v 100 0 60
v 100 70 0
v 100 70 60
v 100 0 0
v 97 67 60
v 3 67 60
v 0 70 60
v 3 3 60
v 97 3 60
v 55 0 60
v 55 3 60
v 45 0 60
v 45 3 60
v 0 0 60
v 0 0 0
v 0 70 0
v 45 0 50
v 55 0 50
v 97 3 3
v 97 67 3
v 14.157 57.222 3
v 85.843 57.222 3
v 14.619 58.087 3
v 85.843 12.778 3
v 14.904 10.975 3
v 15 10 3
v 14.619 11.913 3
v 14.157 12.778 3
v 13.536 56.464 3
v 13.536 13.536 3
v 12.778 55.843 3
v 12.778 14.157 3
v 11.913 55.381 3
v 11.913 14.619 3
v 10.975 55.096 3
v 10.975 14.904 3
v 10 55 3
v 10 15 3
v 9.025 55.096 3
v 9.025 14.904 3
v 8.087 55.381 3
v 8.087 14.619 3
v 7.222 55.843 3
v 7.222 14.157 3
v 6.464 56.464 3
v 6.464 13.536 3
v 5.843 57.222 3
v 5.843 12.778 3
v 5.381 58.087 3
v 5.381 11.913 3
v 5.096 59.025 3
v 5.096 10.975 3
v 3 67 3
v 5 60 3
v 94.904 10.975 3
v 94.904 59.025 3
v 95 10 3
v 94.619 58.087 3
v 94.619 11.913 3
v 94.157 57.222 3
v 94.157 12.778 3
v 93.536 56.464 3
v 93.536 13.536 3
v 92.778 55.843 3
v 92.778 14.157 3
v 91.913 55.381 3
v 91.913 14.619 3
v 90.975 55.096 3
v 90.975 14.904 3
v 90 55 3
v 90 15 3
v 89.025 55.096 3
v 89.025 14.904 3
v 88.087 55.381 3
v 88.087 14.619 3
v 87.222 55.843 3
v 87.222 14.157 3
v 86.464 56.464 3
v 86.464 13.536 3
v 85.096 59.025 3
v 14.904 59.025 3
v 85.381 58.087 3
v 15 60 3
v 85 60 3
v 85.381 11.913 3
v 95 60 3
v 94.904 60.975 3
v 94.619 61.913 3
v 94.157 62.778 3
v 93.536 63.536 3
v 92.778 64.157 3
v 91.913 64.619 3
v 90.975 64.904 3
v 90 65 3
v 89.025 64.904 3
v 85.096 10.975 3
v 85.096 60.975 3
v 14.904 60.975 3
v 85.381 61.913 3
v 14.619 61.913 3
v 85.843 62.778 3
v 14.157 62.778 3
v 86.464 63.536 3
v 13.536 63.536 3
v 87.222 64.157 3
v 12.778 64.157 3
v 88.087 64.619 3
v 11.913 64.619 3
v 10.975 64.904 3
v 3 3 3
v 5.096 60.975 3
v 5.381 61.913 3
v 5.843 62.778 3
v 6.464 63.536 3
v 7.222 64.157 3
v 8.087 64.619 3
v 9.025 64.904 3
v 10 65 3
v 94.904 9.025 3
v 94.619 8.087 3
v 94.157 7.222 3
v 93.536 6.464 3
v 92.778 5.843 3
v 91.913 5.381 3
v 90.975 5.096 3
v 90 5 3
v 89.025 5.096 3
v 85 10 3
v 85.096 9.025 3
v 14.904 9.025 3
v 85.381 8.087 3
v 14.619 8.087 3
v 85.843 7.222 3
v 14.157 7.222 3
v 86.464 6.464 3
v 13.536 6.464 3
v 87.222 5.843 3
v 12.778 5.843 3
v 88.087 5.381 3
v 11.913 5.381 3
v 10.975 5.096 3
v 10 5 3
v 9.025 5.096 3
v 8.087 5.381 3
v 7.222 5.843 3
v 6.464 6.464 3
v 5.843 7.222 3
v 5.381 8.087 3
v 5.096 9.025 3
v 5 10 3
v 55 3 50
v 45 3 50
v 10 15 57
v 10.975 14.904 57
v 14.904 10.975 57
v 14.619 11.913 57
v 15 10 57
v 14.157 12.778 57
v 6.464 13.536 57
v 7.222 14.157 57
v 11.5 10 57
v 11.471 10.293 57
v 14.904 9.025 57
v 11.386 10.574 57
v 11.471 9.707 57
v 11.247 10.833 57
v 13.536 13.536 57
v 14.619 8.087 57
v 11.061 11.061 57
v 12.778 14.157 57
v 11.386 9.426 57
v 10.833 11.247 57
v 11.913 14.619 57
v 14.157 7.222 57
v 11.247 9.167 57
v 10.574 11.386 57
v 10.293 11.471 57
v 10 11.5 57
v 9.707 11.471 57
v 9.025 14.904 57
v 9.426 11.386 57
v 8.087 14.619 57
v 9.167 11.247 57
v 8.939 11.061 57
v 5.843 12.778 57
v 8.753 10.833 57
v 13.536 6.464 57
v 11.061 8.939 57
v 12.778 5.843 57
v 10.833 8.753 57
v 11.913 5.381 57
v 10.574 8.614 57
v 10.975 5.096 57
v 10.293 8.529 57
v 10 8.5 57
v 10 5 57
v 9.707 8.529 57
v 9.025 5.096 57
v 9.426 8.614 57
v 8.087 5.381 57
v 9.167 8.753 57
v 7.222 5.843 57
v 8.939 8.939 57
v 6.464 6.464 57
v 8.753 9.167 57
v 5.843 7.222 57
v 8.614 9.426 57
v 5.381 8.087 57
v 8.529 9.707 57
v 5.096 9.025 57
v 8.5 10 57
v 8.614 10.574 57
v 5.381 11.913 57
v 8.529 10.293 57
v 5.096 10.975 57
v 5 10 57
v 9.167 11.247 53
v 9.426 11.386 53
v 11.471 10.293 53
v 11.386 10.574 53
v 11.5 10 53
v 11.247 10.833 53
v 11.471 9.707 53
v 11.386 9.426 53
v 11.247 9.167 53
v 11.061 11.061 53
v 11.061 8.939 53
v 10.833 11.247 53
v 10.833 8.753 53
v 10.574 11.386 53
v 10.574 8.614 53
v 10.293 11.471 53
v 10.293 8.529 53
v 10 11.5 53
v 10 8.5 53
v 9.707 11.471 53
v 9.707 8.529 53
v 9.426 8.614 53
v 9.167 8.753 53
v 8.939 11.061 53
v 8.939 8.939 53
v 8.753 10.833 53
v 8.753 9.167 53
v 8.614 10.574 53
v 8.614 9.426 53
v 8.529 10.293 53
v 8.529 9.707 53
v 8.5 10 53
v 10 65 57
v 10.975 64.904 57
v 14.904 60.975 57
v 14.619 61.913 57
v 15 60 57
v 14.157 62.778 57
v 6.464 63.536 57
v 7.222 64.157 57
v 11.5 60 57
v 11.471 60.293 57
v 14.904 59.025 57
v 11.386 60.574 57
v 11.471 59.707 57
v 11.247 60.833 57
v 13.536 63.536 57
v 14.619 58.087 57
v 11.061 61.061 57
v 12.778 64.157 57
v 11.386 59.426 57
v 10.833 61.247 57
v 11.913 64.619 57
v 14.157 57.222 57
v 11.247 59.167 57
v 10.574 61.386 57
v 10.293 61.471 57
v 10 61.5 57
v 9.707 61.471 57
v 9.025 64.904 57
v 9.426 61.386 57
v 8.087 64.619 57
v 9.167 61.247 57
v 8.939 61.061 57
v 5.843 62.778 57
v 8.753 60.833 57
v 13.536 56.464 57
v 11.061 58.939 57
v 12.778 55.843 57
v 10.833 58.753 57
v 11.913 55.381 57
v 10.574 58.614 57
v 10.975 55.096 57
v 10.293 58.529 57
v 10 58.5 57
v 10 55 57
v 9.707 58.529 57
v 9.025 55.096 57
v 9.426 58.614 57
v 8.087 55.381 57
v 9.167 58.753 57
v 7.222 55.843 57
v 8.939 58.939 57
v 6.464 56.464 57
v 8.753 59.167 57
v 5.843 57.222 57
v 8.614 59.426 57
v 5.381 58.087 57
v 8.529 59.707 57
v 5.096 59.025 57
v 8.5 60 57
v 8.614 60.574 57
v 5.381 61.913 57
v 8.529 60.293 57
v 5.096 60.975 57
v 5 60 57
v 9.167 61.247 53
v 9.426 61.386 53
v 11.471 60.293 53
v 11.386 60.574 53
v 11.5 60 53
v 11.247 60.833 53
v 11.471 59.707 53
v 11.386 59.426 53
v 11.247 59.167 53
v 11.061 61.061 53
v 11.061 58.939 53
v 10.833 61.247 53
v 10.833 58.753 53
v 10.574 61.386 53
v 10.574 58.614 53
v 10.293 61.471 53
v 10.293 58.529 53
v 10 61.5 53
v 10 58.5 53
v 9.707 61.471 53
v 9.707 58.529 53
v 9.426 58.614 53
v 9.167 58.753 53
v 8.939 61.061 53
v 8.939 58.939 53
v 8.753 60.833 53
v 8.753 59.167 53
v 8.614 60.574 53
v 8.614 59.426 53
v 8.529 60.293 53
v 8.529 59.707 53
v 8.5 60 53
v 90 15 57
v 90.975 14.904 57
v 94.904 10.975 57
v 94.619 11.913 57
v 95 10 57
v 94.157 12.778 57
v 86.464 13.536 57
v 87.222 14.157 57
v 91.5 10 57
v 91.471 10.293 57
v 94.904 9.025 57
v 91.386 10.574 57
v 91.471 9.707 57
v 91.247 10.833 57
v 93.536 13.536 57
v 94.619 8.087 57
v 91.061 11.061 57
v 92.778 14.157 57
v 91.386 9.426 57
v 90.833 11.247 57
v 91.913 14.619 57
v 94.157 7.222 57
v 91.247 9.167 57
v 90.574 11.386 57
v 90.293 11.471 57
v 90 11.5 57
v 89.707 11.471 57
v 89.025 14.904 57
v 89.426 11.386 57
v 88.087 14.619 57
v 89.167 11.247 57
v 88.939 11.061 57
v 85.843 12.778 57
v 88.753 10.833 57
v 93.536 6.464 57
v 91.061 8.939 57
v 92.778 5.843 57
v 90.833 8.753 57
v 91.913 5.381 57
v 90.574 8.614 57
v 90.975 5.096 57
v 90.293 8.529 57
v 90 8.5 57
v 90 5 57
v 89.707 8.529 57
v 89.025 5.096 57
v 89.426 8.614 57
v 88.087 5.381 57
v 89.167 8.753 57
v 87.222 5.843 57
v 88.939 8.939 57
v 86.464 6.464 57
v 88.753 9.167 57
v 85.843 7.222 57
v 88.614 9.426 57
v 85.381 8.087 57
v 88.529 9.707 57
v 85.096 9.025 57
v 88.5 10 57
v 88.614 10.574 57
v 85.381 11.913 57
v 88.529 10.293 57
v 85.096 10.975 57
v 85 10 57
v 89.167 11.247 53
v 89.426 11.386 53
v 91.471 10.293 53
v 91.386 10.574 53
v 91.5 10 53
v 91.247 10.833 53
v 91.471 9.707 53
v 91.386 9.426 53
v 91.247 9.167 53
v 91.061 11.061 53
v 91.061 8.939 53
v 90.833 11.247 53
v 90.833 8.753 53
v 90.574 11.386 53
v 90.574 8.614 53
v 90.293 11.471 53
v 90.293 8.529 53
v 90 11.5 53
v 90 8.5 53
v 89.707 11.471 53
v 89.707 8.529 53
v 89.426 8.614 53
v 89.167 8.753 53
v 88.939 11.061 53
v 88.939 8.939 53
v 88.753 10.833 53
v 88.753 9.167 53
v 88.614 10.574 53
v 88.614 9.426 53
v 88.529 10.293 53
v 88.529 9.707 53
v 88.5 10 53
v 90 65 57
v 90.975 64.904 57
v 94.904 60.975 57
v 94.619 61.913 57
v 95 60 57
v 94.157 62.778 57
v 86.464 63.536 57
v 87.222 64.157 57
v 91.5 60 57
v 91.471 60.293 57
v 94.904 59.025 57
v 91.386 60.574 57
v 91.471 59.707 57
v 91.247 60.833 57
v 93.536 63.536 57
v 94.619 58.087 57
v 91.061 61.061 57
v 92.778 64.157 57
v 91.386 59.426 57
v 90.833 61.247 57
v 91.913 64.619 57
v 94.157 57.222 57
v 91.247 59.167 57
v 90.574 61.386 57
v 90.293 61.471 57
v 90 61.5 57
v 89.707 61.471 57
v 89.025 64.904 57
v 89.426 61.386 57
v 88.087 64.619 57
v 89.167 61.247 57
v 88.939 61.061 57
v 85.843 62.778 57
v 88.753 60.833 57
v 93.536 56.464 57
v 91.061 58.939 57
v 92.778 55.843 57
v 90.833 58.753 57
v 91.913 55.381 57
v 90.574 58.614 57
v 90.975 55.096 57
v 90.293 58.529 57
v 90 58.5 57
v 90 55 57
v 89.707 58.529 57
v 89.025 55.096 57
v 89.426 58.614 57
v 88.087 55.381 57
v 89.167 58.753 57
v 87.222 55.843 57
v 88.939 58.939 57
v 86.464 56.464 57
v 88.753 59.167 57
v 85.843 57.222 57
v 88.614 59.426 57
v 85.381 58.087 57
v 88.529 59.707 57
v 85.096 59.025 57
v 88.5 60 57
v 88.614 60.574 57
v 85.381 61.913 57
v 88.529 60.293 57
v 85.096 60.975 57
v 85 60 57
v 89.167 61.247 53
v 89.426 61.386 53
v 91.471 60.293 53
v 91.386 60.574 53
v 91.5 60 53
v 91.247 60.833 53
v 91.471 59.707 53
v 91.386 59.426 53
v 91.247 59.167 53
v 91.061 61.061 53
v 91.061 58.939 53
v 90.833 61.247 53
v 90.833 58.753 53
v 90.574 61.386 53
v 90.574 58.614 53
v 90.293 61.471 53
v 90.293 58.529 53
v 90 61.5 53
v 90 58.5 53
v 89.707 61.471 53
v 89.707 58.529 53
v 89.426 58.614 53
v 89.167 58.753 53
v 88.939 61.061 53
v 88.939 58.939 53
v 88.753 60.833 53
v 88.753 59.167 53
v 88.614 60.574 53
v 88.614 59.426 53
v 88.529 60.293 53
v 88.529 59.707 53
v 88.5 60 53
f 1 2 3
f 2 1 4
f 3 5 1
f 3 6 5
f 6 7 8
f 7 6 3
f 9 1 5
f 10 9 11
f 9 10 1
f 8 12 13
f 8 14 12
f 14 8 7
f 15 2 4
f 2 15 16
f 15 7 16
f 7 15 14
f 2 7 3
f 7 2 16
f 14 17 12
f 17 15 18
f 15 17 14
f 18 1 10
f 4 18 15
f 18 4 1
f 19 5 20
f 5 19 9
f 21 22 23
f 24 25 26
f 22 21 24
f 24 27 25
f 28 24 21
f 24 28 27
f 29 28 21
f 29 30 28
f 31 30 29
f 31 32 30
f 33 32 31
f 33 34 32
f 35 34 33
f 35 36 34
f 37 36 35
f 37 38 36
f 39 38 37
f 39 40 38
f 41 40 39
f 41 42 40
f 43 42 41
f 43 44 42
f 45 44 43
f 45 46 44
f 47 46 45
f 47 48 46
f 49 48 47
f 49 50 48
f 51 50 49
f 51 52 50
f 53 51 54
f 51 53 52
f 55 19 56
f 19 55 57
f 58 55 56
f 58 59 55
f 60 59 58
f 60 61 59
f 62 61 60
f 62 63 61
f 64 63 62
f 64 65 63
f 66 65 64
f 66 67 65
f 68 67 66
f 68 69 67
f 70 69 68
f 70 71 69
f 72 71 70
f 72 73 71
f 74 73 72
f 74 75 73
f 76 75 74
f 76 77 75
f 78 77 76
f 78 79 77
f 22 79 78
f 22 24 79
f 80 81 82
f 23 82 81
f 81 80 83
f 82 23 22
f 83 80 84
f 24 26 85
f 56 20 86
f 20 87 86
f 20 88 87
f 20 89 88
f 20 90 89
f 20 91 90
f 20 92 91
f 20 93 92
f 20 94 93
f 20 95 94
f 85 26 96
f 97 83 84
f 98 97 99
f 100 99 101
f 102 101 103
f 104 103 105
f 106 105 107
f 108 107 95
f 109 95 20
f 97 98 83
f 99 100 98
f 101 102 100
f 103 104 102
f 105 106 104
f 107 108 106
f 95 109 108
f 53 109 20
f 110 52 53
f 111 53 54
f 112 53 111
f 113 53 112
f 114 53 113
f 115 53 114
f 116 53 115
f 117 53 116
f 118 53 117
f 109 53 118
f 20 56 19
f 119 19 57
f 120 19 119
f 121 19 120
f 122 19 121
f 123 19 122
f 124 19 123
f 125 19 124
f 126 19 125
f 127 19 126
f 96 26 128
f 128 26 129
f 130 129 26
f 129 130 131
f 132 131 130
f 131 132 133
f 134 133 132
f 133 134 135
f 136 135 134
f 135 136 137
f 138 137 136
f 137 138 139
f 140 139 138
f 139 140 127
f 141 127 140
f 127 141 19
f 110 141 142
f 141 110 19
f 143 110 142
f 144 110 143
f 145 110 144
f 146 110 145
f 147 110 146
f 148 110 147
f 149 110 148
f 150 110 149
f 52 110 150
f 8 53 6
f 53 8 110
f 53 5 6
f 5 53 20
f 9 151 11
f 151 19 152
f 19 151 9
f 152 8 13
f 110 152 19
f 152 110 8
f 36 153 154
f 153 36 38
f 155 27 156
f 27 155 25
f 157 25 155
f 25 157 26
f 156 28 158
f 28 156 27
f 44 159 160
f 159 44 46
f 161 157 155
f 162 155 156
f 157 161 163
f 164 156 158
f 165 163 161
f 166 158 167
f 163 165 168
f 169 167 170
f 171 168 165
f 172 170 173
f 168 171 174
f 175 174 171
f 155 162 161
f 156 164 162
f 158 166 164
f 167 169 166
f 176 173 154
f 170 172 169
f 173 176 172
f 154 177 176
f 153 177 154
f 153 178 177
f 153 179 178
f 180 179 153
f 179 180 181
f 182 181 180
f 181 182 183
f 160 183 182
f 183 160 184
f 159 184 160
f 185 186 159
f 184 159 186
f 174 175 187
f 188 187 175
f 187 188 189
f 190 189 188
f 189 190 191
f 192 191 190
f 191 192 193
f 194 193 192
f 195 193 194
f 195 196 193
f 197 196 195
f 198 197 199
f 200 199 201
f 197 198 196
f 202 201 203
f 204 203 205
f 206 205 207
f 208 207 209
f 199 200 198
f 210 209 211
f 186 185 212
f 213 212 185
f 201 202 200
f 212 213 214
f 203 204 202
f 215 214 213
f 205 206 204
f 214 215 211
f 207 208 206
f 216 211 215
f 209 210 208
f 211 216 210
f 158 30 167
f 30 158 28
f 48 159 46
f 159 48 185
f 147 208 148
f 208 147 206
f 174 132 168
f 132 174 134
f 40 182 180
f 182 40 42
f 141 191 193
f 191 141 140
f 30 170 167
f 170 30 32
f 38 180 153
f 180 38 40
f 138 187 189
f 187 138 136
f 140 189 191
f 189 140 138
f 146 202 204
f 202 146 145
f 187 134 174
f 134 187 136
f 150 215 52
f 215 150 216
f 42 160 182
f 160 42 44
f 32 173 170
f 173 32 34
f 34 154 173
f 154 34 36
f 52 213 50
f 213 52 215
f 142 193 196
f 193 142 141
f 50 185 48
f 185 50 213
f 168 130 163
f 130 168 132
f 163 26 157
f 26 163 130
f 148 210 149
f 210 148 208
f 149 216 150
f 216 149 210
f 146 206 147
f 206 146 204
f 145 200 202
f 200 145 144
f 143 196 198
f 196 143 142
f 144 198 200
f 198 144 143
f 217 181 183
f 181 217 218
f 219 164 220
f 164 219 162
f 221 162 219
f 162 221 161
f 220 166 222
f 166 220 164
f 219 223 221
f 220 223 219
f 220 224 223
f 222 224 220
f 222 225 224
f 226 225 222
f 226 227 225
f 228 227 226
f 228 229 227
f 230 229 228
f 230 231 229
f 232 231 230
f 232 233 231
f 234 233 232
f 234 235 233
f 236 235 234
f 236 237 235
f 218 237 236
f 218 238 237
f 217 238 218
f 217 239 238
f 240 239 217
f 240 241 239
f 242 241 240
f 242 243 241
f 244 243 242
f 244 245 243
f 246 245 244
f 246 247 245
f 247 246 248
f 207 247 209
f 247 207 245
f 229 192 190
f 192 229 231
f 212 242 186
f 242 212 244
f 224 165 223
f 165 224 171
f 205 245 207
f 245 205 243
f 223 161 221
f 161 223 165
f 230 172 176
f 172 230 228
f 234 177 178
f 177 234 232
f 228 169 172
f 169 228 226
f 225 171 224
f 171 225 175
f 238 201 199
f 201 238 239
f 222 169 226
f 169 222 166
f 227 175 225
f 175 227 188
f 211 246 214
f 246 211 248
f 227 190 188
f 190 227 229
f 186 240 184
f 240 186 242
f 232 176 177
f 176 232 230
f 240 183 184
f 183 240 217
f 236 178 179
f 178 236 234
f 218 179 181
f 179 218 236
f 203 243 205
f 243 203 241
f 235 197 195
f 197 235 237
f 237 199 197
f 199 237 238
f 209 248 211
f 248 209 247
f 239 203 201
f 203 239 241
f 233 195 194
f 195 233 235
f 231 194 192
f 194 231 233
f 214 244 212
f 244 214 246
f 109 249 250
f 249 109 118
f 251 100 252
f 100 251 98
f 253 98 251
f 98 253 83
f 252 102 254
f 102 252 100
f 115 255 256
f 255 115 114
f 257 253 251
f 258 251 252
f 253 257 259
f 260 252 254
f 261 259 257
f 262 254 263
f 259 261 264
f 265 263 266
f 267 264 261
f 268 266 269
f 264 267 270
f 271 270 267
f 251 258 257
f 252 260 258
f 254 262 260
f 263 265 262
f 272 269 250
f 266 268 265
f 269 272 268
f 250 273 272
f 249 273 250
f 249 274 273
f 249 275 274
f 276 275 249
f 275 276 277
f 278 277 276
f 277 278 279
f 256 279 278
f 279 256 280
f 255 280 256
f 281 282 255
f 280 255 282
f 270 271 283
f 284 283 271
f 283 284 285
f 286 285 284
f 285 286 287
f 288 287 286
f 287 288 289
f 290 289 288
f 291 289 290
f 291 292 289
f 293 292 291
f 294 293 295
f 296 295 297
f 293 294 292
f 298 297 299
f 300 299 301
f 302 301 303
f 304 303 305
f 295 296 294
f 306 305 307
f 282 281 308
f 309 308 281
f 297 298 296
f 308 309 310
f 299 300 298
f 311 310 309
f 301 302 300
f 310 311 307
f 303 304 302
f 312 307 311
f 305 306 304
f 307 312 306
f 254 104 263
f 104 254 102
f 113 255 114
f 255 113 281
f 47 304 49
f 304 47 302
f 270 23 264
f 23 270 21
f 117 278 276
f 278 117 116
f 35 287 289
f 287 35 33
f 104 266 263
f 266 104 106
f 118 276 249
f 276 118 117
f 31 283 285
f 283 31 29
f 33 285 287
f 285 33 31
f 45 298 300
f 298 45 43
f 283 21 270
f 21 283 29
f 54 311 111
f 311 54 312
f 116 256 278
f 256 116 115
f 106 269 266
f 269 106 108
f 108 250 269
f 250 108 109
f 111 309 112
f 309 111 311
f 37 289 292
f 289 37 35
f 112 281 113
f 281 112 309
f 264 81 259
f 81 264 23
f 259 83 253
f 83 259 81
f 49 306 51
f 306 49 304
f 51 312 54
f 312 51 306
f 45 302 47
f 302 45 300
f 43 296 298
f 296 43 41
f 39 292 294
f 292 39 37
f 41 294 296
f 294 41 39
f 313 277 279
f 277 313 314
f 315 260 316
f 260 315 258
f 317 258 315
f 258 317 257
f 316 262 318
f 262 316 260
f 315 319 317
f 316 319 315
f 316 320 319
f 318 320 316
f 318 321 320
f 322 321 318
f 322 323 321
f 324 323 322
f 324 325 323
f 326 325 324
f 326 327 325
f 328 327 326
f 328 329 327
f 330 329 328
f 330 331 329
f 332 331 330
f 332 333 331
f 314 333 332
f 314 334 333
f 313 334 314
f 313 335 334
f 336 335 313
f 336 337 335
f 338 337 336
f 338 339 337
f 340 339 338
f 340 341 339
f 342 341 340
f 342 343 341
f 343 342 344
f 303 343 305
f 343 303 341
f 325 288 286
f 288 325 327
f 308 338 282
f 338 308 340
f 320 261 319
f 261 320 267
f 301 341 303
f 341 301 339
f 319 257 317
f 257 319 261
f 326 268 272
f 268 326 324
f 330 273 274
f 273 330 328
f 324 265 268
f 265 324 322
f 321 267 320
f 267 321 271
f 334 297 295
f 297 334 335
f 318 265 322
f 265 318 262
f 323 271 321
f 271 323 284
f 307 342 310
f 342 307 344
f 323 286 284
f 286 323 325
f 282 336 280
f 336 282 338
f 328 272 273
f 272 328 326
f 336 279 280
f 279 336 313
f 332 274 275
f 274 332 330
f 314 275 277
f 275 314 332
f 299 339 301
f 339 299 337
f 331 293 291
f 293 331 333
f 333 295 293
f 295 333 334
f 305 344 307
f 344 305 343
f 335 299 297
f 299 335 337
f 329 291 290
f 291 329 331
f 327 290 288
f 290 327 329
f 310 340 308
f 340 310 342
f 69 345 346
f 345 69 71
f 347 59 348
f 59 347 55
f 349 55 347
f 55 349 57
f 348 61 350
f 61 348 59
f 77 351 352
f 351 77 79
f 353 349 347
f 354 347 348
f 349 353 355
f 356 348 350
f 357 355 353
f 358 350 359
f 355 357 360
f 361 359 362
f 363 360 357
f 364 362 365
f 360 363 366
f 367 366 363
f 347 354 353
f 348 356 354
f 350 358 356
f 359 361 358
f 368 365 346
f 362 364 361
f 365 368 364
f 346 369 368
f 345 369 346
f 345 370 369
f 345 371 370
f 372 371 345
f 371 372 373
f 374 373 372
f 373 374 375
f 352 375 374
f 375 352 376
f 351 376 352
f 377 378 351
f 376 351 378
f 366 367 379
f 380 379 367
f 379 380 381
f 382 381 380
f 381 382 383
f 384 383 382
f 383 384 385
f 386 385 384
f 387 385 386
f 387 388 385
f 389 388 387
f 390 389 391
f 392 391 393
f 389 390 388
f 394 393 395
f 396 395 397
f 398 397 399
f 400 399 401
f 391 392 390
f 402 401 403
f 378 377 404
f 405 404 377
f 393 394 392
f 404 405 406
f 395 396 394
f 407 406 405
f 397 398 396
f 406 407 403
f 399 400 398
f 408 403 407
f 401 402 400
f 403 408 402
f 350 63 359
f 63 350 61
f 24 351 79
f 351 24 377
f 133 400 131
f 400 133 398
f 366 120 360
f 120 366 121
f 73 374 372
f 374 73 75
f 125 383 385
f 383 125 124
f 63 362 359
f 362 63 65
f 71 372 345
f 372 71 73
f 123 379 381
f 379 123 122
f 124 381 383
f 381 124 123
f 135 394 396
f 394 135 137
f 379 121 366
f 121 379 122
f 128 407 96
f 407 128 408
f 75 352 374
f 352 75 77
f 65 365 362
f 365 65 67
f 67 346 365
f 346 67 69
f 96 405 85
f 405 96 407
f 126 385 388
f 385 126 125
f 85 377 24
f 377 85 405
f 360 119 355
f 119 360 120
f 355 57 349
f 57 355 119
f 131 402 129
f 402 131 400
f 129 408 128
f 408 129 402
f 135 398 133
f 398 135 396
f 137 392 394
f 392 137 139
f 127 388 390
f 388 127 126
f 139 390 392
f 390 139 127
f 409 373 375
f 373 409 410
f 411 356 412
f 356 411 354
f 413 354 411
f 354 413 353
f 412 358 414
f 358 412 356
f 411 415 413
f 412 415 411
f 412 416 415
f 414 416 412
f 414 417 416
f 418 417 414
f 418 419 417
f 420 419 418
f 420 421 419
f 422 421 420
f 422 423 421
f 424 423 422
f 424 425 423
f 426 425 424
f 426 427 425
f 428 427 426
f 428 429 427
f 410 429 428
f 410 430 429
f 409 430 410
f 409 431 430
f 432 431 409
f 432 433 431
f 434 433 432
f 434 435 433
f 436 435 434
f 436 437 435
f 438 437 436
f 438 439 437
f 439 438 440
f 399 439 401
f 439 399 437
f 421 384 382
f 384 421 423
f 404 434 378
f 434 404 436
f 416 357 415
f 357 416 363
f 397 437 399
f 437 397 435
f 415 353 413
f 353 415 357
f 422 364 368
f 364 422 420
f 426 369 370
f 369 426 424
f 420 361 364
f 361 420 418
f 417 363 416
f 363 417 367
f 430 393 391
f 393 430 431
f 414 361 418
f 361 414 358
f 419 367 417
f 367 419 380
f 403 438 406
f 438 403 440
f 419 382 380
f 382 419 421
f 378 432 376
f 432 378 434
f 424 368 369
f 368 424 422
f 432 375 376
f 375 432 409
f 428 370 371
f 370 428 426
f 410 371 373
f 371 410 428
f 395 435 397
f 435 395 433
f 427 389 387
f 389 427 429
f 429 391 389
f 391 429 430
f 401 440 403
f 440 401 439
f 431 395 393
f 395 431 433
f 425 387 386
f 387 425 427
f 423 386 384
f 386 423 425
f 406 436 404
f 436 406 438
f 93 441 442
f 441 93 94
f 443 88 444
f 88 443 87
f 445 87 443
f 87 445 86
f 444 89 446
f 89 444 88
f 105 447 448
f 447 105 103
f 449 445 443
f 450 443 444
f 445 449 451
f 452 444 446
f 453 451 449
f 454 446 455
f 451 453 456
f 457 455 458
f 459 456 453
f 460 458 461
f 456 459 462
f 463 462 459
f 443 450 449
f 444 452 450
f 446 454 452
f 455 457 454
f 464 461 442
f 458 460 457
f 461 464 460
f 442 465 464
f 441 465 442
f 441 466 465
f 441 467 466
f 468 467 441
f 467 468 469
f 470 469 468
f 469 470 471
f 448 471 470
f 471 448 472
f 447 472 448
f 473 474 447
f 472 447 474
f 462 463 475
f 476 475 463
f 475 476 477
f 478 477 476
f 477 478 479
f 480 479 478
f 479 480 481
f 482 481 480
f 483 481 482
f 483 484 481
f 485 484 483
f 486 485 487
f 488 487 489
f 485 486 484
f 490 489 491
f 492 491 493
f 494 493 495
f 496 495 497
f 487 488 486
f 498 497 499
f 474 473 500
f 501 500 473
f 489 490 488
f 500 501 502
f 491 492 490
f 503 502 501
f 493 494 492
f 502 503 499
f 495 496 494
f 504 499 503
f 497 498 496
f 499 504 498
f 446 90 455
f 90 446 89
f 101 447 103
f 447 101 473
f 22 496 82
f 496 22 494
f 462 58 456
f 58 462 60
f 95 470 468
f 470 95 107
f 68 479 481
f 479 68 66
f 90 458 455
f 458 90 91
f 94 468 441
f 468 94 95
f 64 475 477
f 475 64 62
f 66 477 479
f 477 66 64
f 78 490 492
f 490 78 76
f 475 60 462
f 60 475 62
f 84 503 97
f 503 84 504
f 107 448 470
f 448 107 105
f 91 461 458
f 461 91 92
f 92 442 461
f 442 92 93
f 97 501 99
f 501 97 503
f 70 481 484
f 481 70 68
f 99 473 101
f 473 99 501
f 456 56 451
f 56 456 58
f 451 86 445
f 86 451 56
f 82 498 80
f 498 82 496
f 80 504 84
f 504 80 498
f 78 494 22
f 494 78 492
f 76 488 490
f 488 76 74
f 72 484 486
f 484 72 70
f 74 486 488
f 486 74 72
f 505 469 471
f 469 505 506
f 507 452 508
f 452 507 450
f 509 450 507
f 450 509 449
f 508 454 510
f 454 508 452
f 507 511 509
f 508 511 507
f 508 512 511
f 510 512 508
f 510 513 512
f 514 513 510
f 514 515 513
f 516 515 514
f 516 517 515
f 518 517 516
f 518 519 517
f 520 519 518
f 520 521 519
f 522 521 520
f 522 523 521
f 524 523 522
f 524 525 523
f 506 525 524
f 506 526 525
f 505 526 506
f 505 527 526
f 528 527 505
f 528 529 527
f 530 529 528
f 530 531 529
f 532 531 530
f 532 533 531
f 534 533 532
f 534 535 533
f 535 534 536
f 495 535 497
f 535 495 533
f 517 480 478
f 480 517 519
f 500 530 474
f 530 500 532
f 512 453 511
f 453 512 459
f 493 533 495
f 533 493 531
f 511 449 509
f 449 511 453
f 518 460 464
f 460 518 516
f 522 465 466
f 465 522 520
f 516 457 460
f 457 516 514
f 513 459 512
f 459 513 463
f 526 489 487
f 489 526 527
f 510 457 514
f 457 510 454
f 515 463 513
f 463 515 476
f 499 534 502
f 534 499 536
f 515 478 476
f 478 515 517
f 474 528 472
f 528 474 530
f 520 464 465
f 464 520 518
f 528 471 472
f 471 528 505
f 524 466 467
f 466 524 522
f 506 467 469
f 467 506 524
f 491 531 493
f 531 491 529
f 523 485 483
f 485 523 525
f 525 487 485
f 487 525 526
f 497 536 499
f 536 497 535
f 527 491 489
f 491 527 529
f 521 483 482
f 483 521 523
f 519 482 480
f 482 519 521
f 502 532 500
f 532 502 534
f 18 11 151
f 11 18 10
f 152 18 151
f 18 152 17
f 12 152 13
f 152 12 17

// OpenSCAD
$fn = 32;

// ----------------------------------------------------------------------
// Enclosure box: both enclosure
// ----------------------------------------------------------------------

// --- parameters (mm) ---
box_l = 100;              // outer length, X
box_w = 70;               // outer width, Y
box_h = 60;               // outer height
wall_t = 3;               // wall thickness
boss_r = 5;               // corner boss radius
hole_r = 1.5;             // boss screw hole radius
boss_in = 10;             // boss inset from the corners
notch_w = 10;             // cable notch width
notch_h = 10;             // cable notch height

inner_h = box_h - wall_t;  // cavity depth
boss_h = inner_h - 2;  // corner boss height

difference() {
  union() {
    difference() {
      cube([box_l, box_w, box_h]);
      translate([wall_t, wall_t, wall_t])
        cube([box_l - 2 * wall_t, box_w - 2 * wall_t, box_h]);
    }
    for (sx = [0, 1], sy = [0, 1])
      translate([sx ? box_l - boss_in : boss_in,
                 sy ? box_w - boss_in : boss_in, wall_t - 1])
        difference() {
          cylinder(r = boss_r, h = boss_h);
          translate([0, 0, boss_h - 4])
            cylinder(r = hole_r, h = 5);
        }
  }
  translate([box_l / 2 - notch_w / 2, -1, box_h - notch_h])
    cube([notch_w, wall_t + 2, notch_h + 1]);
}
